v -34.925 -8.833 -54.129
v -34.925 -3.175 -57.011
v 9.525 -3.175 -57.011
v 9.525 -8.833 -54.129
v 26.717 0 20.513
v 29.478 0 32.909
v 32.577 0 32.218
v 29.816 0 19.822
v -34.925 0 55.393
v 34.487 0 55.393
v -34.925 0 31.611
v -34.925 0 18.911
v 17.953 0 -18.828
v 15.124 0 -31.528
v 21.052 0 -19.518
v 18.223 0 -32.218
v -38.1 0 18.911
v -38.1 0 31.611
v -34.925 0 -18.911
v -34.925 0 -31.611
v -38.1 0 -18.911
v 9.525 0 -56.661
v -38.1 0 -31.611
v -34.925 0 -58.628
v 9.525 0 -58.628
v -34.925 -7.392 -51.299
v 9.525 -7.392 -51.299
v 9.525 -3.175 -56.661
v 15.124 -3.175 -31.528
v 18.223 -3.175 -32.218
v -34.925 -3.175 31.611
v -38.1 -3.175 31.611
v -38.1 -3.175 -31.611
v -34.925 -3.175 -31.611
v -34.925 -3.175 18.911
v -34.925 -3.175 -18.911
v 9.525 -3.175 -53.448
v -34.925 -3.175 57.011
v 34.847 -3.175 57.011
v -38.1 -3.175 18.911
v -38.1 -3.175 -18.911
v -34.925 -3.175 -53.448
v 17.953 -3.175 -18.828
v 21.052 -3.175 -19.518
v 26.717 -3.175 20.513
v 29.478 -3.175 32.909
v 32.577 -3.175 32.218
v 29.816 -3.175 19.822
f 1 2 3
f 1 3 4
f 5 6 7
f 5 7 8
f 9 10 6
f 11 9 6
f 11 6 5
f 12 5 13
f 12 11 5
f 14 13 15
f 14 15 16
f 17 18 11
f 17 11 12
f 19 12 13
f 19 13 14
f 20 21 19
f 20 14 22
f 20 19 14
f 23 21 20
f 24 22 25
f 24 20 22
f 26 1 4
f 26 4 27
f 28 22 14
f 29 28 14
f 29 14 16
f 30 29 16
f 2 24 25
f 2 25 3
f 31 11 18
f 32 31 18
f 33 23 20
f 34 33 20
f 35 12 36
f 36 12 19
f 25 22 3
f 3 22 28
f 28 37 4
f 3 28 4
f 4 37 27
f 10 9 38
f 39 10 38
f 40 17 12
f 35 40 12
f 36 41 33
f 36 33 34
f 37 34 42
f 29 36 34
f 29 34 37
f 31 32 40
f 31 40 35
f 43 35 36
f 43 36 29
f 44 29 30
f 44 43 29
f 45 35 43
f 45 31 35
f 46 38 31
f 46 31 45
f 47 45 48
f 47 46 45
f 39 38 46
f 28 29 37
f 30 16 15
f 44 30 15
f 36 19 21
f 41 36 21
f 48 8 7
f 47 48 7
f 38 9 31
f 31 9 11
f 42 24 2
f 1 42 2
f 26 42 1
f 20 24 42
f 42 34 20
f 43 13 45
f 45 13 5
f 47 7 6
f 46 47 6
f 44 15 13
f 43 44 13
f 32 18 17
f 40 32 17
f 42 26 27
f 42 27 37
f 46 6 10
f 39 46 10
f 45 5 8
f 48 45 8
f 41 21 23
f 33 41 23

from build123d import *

# Parameters (mm, degrees)
F1_DEPTH = 3.175
F3_DEPTH = 43.942
F5_DEPTH = 76.2
F6_DEPTH = 44.45


# Not quite as in the source:
# - a feature names something its author has since deleted; it is built from what else it names


with BuildPart() as f1:
    # F0 (on Front) → F1 (new body)
    with BuildSketch(Plane.XZ):
        Polygon((-34.925, -57.0107064), (9.4471751978, -57.0107064), (15.1238233026, -31.5280514049), (18.2228604819, -32.2184089652), (21.0519782071, -19.5184089652), (17.9529410277, -18.8280514049), (26.7166720978, 20.512617808), (29.8157092771, 19.8222602477), (32.5771395181, 32.2184089652), (29.4781023387, 32.9087665254), (34.8471751978, 57.0107064), (-34.925, 57.0107064), (-34.925, 31.6107064), (-38.1, 31.6107064), (-38.1, 18.9107064), (-34.925, 18.9107064), (-34.925, -18.9107064), (-38.1, -18.9107064), (-38.1, -31.6107064), (-34.925, -31.6107064), align=None)
    extrude(amount=F1_DEPTH)

    # F2 (on face) → F3 (join)
    with BuildSketch(Plane(origin=(-34.925, 0, 0), x_dir=(0, -1, 0), z_dir=(-1, 0, 0))):
        Polygon((0, -58.6279720227), (3.175, -57.0107064), (8.8332357394, -54.1285425744), (7.3921538265, -51.2994247047), (0, -55.0648030547), align=None)
    extrude(amount=-F3_DEPTH)

    # F4 (on face) → F5 (cut)
    with BuildSketch(Plane(origin=(-34.925, 0, 0), x_dir=(0, -1, 0), z_dir=(-1, 0, 0))):
        Polygon((0, 55.3934407773), (3.175, 57.0107064), (0, 57.0107064), align=None)
    extrude(amount=-F5_DEPTH, mode=Mode.SUBTRACT)

    # F2 (on face) → F6 (join)
    with BuildSketch(Plane(origin=(-34.925, 0, 0), x_dir=(0, -1, 0), z_dir=(-1, 0, 0))):
        Polygon((0, -58.6279720227), (3.175, -57.0107064), (8.8332357394, -54.1285425744), (7.3921538265, -51.2994247047), (0, -55.0648030547), align=None)
    extrude(amount=-F6_DEPTH)


solid = f1.part
